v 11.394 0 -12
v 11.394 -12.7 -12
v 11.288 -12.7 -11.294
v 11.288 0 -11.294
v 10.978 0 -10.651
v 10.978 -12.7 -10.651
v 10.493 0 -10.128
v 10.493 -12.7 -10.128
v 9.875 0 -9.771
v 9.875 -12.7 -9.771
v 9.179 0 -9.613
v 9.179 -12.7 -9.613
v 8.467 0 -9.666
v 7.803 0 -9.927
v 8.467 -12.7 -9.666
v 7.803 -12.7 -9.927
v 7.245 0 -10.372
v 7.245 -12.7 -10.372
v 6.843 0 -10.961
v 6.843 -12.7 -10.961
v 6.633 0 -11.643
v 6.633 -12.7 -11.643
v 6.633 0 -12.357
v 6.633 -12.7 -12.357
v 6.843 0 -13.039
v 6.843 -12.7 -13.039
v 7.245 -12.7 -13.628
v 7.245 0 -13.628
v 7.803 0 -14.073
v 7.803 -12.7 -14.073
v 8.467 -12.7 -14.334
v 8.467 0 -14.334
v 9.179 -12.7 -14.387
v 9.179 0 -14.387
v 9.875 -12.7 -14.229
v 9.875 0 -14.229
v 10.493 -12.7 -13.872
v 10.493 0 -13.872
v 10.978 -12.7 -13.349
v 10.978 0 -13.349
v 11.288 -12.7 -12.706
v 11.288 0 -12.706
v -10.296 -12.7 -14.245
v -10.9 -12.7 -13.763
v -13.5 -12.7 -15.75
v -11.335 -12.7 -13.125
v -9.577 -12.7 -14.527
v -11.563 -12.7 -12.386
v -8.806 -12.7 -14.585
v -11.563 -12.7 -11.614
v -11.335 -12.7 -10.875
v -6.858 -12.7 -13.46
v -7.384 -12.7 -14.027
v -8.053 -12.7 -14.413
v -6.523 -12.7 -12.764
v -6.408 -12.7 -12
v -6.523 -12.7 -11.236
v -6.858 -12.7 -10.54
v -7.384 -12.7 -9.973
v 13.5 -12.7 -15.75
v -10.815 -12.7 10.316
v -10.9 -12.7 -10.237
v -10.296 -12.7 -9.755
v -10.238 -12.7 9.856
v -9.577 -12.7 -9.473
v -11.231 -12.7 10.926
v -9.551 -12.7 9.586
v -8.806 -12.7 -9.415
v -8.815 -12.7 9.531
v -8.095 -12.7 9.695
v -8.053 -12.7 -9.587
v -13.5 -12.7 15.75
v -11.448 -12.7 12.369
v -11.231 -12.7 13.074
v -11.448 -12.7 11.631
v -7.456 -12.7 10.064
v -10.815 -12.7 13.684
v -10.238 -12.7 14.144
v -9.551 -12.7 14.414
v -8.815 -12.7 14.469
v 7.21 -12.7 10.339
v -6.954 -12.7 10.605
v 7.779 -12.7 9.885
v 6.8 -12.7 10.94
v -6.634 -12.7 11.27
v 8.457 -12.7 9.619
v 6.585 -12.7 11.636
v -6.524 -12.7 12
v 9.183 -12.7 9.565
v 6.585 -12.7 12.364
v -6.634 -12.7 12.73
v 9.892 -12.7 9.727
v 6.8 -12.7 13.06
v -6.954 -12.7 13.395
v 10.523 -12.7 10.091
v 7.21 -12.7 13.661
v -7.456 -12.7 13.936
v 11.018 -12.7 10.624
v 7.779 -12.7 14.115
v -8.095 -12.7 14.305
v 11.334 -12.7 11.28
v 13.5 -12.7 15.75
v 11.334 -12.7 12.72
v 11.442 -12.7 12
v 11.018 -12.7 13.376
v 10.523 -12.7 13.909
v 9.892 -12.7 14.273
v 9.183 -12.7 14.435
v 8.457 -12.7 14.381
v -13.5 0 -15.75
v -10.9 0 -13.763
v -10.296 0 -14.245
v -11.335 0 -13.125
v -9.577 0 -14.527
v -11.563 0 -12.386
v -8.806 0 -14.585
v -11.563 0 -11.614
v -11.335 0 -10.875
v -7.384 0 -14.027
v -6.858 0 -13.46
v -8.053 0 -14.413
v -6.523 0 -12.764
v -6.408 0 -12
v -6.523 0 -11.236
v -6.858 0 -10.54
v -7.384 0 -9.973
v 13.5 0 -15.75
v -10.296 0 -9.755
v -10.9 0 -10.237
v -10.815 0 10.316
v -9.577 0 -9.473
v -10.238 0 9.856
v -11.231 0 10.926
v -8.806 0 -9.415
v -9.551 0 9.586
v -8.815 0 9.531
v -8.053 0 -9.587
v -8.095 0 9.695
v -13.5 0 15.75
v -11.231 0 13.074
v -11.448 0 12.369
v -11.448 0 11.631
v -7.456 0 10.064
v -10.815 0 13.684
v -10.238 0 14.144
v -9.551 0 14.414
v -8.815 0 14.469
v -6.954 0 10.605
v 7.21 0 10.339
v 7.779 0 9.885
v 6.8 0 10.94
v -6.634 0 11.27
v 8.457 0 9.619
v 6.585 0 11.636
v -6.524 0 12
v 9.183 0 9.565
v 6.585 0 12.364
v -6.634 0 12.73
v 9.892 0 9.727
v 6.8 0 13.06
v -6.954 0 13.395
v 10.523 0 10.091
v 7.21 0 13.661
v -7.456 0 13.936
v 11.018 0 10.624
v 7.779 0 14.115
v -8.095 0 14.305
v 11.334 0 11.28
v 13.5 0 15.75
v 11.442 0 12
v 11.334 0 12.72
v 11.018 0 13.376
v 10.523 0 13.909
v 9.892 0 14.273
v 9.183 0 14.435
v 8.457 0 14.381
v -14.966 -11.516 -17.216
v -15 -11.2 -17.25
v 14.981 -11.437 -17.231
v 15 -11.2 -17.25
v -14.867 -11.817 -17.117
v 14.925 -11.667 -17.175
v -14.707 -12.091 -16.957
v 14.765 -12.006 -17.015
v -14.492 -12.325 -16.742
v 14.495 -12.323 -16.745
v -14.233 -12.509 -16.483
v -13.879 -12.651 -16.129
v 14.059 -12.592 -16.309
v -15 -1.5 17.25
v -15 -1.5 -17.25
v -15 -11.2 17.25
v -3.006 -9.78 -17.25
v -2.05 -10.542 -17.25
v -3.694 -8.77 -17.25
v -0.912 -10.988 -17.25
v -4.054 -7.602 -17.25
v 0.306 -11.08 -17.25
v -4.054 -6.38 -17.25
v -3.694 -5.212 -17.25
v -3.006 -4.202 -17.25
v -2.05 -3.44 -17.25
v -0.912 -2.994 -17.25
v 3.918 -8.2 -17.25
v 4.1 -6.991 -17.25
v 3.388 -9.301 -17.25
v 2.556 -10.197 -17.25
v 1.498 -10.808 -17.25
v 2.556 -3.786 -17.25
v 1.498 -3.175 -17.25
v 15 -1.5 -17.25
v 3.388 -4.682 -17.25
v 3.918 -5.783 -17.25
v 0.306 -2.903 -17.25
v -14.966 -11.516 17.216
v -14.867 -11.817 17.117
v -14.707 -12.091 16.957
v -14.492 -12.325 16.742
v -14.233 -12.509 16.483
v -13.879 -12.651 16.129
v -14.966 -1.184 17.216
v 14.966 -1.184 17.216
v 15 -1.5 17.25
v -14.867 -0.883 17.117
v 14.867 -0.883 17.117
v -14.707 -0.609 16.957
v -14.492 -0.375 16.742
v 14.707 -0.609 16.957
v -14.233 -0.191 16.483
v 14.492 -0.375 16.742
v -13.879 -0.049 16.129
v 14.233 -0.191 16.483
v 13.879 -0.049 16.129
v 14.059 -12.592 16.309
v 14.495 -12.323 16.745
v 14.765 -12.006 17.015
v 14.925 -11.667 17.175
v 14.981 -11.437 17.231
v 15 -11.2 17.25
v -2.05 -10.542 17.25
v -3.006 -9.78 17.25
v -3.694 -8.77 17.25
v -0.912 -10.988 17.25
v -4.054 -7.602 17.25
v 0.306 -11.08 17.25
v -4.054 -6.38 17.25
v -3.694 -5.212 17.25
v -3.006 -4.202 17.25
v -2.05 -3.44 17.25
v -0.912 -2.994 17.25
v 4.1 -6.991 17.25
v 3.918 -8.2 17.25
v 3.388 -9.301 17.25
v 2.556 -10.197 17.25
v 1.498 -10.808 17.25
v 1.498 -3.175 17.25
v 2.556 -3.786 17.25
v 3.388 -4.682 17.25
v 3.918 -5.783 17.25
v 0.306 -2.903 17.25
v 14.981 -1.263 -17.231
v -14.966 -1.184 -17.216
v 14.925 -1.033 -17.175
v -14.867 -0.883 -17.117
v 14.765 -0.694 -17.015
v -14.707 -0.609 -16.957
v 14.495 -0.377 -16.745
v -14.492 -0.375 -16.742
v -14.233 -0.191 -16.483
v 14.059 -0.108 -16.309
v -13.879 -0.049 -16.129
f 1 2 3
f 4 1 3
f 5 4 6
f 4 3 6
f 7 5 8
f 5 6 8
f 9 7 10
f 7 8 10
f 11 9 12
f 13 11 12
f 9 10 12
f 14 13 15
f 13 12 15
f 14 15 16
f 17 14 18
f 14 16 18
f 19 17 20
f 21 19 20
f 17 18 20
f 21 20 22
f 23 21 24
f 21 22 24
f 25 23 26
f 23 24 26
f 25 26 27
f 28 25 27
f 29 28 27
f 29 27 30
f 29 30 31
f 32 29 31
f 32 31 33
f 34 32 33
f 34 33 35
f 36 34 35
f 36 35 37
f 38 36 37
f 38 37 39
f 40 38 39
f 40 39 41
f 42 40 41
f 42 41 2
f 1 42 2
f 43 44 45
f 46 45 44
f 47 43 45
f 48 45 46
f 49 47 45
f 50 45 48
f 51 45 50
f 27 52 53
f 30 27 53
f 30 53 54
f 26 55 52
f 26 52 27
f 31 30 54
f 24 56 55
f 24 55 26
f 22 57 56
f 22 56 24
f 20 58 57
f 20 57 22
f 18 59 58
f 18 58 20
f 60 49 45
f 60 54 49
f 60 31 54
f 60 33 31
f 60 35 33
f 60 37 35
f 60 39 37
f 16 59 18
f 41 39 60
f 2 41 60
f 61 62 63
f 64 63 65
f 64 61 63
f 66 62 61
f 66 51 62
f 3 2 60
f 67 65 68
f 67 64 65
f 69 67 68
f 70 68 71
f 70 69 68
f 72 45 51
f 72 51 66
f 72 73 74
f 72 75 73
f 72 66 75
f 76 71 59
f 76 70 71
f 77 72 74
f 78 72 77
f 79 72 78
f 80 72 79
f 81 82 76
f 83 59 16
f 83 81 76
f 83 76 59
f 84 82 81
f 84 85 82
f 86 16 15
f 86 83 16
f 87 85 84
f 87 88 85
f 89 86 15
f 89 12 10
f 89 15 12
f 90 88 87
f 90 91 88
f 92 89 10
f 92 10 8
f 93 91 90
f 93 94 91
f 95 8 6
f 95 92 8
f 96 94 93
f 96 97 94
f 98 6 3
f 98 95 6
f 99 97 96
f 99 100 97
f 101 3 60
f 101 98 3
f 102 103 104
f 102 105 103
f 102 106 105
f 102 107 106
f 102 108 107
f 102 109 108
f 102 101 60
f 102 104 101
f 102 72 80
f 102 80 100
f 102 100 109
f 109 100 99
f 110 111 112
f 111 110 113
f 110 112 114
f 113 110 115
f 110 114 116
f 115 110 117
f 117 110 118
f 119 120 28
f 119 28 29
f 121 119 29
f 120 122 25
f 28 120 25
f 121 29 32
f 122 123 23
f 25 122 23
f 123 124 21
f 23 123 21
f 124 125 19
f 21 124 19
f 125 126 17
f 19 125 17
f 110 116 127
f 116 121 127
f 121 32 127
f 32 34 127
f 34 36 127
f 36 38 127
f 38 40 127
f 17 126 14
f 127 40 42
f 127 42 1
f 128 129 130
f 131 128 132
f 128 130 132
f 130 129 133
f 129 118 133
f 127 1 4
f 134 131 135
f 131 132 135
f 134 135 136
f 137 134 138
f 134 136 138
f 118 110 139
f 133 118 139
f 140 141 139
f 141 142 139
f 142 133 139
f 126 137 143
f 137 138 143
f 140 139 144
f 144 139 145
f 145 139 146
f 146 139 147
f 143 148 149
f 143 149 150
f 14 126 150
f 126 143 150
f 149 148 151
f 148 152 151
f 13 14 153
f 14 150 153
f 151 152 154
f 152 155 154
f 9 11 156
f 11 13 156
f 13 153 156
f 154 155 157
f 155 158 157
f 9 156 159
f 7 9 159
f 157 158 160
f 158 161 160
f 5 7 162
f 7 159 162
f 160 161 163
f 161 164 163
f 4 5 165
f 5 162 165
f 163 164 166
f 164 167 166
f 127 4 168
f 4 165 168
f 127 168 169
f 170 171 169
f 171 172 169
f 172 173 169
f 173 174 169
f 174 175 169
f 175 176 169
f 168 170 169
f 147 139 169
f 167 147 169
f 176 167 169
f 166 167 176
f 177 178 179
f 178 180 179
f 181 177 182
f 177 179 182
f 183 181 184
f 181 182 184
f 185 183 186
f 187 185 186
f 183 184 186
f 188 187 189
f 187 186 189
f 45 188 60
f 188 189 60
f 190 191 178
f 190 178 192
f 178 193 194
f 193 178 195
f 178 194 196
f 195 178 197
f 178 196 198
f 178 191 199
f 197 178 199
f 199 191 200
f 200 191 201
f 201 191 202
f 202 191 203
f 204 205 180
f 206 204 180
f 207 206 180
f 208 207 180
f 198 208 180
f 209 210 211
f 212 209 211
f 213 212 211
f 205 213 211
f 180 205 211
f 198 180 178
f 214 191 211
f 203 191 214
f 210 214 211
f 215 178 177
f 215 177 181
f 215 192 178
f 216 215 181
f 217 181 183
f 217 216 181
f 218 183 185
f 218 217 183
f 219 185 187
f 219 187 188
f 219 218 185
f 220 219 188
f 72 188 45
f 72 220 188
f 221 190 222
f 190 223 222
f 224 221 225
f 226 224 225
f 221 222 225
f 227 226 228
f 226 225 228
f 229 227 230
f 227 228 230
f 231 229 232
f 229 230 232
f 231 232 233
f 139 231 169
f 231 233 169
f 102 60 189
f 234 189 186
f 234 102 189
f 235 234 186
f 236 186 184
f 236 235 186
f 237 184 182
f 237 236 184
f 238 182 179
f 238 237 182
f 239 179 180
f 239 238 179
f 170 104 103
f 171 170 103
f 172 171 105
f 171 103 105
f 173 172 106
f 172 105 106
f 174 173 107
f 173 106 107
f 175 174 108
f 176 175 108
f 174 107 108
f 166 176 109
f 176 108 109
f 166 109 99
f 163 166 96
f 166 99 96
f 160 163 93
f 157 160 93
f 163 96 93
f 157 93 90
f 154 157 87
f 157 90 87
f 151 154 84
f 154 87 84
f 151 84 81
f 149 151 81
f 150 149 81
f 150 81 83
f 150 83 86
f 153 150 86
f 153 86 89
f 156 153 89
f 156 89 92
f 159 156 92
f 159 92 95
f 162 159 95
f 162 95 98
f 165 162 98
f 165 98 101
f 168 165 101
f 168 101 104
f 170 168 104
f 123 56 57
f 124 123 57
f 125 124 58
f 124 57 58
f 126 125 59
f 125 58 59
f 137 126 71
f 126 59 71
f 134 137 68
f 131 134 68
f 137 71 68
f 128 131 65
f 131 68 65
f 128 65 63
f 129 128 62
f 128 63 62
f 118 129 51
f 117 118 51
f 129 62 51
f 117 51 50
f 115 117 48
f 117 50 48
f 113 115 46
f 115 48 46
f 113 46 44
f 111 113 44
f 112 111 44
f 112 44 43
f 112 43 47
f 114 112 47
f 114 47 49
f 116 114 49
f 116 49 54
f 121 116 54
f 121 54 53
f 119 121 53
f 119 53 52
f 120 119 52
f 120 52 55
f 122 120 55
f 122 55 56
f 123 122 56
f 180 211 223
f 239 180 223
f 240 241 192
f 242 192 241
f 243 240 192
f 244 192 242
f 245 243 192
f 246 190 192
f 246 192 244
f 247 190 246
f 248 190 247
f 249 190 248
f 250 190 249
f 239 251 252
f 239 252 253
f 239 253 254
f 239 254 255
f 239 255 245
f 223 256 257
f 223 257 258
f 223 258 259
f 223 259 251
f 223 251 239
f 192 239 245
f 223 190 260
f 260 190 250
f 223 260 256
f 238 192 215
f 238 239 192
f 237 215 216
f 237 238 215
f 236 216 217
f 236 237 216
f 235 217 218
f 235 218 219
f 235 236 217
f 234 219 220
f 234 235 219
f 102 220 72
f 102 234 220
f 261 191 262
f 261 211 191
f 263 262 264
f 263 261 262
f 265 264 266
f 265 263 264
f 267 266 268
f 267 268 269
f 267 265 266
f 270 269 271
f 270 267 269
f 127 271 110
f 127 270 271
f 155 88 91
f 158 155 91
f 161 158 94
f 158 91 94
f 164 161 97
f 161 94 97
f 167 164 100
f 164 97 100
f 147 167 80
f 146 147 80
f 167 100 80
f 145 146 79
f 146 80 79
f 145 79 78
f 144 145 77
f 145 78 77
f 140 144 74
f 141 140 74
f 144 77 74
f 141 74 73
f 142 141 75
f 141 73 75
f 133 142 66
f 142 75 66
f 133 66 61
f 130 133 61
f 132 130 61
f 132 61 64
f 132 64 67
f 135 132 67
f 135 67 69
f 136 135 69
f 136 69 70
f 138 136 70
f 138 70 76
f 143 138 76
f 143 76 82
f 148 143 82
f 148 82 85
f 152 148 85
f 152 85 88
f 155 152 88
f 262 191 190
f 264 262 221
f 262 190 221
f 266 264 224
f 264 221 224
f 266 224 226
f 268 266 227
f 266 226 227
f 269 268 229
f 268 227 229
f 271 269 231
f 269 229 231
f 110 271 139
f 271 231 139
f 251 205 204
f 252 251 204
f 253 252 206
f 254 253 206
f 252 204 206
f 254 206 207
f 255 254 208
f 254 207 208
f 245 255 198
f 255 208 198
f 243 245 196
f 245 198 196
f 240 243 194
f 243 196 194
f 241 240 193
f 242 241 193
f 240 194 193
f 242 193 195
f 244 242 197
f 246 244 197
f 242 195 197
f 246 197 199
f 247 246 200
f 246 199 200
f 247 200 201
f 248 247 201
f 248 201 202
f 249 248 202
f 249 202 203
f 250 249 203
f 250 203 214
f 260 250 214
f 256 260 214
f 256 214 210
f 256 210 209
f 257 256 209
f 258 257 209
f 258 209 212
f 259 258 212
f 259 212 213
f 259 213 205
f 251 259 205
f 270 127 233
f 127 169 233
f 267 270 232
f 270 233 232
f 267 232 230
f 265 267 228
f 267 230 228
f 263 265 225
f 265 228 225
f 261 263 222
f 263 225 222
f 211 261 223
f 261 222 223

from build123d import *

# Parameters (mm, degrees)
F0_W     = 30
F0_H     = 34.5
F1_DEPTH = 12.7
F2_R     = 2.47581
F2_R_2   = 2.592186
F2_R_3   = 2.442266
F2_R_4   = 2.394142
F3_DEPTH = 12.701
F4_R     = 1.5
F5_R     = 4.1
F6_DEPTH = 34.501


with BuildPart() as f1:
    # F0 (on Front) → F1 (new body)
    with BuildSketch(Plane.XZ):
        Rectangle(F0_W, F0_H)
    extrude(amount=F1_DEPTH)

    # F2 (on face) → F3 (cut, through all)
    with BuildSketch(Plane.XZ.offset(12.7)):
        with Locations((-9, 12)):
            Circle(F2_R)
        with Locations((-9, -12)):
            Circle(F2_R_2)
        with Locations((9, 12)):
            Circle(F2_R_3)
        with Locations((9, -12)):
            Circle(F2_R_4)
    extrude(amount=-F3_DEPTH, mode=Mode.SUBTRACT)

    # F4
    f4_edges = [f1.edges().sort_by_distance(p)[0] for p in [
        (-15, 0, 0),
        (0, 0, 17.25),
        (15, 0, 0),
        (0, 0, -17.25),
        (15, -12.7, 0),
        (0, -12.7, 17.25),
        (-15, -12.7, 0),
        (0, -12.7, -17.25),
    ]]
    fillet(f4_edges, radius=F4_R)

    # F5 (on face) → F6 (cut, through all)
    with BuildSketch(Plane(origin=(0, 0, -17.25), x_dir=(1, 0, 0), z_dir=(0, 0, -1))):
        with Locations((0, 6.991122)):
            Circle(F5_R)
    extrude(amount=-F6_DEPTH, mode=Mode.SUBTRACT)


solid = f1.part
